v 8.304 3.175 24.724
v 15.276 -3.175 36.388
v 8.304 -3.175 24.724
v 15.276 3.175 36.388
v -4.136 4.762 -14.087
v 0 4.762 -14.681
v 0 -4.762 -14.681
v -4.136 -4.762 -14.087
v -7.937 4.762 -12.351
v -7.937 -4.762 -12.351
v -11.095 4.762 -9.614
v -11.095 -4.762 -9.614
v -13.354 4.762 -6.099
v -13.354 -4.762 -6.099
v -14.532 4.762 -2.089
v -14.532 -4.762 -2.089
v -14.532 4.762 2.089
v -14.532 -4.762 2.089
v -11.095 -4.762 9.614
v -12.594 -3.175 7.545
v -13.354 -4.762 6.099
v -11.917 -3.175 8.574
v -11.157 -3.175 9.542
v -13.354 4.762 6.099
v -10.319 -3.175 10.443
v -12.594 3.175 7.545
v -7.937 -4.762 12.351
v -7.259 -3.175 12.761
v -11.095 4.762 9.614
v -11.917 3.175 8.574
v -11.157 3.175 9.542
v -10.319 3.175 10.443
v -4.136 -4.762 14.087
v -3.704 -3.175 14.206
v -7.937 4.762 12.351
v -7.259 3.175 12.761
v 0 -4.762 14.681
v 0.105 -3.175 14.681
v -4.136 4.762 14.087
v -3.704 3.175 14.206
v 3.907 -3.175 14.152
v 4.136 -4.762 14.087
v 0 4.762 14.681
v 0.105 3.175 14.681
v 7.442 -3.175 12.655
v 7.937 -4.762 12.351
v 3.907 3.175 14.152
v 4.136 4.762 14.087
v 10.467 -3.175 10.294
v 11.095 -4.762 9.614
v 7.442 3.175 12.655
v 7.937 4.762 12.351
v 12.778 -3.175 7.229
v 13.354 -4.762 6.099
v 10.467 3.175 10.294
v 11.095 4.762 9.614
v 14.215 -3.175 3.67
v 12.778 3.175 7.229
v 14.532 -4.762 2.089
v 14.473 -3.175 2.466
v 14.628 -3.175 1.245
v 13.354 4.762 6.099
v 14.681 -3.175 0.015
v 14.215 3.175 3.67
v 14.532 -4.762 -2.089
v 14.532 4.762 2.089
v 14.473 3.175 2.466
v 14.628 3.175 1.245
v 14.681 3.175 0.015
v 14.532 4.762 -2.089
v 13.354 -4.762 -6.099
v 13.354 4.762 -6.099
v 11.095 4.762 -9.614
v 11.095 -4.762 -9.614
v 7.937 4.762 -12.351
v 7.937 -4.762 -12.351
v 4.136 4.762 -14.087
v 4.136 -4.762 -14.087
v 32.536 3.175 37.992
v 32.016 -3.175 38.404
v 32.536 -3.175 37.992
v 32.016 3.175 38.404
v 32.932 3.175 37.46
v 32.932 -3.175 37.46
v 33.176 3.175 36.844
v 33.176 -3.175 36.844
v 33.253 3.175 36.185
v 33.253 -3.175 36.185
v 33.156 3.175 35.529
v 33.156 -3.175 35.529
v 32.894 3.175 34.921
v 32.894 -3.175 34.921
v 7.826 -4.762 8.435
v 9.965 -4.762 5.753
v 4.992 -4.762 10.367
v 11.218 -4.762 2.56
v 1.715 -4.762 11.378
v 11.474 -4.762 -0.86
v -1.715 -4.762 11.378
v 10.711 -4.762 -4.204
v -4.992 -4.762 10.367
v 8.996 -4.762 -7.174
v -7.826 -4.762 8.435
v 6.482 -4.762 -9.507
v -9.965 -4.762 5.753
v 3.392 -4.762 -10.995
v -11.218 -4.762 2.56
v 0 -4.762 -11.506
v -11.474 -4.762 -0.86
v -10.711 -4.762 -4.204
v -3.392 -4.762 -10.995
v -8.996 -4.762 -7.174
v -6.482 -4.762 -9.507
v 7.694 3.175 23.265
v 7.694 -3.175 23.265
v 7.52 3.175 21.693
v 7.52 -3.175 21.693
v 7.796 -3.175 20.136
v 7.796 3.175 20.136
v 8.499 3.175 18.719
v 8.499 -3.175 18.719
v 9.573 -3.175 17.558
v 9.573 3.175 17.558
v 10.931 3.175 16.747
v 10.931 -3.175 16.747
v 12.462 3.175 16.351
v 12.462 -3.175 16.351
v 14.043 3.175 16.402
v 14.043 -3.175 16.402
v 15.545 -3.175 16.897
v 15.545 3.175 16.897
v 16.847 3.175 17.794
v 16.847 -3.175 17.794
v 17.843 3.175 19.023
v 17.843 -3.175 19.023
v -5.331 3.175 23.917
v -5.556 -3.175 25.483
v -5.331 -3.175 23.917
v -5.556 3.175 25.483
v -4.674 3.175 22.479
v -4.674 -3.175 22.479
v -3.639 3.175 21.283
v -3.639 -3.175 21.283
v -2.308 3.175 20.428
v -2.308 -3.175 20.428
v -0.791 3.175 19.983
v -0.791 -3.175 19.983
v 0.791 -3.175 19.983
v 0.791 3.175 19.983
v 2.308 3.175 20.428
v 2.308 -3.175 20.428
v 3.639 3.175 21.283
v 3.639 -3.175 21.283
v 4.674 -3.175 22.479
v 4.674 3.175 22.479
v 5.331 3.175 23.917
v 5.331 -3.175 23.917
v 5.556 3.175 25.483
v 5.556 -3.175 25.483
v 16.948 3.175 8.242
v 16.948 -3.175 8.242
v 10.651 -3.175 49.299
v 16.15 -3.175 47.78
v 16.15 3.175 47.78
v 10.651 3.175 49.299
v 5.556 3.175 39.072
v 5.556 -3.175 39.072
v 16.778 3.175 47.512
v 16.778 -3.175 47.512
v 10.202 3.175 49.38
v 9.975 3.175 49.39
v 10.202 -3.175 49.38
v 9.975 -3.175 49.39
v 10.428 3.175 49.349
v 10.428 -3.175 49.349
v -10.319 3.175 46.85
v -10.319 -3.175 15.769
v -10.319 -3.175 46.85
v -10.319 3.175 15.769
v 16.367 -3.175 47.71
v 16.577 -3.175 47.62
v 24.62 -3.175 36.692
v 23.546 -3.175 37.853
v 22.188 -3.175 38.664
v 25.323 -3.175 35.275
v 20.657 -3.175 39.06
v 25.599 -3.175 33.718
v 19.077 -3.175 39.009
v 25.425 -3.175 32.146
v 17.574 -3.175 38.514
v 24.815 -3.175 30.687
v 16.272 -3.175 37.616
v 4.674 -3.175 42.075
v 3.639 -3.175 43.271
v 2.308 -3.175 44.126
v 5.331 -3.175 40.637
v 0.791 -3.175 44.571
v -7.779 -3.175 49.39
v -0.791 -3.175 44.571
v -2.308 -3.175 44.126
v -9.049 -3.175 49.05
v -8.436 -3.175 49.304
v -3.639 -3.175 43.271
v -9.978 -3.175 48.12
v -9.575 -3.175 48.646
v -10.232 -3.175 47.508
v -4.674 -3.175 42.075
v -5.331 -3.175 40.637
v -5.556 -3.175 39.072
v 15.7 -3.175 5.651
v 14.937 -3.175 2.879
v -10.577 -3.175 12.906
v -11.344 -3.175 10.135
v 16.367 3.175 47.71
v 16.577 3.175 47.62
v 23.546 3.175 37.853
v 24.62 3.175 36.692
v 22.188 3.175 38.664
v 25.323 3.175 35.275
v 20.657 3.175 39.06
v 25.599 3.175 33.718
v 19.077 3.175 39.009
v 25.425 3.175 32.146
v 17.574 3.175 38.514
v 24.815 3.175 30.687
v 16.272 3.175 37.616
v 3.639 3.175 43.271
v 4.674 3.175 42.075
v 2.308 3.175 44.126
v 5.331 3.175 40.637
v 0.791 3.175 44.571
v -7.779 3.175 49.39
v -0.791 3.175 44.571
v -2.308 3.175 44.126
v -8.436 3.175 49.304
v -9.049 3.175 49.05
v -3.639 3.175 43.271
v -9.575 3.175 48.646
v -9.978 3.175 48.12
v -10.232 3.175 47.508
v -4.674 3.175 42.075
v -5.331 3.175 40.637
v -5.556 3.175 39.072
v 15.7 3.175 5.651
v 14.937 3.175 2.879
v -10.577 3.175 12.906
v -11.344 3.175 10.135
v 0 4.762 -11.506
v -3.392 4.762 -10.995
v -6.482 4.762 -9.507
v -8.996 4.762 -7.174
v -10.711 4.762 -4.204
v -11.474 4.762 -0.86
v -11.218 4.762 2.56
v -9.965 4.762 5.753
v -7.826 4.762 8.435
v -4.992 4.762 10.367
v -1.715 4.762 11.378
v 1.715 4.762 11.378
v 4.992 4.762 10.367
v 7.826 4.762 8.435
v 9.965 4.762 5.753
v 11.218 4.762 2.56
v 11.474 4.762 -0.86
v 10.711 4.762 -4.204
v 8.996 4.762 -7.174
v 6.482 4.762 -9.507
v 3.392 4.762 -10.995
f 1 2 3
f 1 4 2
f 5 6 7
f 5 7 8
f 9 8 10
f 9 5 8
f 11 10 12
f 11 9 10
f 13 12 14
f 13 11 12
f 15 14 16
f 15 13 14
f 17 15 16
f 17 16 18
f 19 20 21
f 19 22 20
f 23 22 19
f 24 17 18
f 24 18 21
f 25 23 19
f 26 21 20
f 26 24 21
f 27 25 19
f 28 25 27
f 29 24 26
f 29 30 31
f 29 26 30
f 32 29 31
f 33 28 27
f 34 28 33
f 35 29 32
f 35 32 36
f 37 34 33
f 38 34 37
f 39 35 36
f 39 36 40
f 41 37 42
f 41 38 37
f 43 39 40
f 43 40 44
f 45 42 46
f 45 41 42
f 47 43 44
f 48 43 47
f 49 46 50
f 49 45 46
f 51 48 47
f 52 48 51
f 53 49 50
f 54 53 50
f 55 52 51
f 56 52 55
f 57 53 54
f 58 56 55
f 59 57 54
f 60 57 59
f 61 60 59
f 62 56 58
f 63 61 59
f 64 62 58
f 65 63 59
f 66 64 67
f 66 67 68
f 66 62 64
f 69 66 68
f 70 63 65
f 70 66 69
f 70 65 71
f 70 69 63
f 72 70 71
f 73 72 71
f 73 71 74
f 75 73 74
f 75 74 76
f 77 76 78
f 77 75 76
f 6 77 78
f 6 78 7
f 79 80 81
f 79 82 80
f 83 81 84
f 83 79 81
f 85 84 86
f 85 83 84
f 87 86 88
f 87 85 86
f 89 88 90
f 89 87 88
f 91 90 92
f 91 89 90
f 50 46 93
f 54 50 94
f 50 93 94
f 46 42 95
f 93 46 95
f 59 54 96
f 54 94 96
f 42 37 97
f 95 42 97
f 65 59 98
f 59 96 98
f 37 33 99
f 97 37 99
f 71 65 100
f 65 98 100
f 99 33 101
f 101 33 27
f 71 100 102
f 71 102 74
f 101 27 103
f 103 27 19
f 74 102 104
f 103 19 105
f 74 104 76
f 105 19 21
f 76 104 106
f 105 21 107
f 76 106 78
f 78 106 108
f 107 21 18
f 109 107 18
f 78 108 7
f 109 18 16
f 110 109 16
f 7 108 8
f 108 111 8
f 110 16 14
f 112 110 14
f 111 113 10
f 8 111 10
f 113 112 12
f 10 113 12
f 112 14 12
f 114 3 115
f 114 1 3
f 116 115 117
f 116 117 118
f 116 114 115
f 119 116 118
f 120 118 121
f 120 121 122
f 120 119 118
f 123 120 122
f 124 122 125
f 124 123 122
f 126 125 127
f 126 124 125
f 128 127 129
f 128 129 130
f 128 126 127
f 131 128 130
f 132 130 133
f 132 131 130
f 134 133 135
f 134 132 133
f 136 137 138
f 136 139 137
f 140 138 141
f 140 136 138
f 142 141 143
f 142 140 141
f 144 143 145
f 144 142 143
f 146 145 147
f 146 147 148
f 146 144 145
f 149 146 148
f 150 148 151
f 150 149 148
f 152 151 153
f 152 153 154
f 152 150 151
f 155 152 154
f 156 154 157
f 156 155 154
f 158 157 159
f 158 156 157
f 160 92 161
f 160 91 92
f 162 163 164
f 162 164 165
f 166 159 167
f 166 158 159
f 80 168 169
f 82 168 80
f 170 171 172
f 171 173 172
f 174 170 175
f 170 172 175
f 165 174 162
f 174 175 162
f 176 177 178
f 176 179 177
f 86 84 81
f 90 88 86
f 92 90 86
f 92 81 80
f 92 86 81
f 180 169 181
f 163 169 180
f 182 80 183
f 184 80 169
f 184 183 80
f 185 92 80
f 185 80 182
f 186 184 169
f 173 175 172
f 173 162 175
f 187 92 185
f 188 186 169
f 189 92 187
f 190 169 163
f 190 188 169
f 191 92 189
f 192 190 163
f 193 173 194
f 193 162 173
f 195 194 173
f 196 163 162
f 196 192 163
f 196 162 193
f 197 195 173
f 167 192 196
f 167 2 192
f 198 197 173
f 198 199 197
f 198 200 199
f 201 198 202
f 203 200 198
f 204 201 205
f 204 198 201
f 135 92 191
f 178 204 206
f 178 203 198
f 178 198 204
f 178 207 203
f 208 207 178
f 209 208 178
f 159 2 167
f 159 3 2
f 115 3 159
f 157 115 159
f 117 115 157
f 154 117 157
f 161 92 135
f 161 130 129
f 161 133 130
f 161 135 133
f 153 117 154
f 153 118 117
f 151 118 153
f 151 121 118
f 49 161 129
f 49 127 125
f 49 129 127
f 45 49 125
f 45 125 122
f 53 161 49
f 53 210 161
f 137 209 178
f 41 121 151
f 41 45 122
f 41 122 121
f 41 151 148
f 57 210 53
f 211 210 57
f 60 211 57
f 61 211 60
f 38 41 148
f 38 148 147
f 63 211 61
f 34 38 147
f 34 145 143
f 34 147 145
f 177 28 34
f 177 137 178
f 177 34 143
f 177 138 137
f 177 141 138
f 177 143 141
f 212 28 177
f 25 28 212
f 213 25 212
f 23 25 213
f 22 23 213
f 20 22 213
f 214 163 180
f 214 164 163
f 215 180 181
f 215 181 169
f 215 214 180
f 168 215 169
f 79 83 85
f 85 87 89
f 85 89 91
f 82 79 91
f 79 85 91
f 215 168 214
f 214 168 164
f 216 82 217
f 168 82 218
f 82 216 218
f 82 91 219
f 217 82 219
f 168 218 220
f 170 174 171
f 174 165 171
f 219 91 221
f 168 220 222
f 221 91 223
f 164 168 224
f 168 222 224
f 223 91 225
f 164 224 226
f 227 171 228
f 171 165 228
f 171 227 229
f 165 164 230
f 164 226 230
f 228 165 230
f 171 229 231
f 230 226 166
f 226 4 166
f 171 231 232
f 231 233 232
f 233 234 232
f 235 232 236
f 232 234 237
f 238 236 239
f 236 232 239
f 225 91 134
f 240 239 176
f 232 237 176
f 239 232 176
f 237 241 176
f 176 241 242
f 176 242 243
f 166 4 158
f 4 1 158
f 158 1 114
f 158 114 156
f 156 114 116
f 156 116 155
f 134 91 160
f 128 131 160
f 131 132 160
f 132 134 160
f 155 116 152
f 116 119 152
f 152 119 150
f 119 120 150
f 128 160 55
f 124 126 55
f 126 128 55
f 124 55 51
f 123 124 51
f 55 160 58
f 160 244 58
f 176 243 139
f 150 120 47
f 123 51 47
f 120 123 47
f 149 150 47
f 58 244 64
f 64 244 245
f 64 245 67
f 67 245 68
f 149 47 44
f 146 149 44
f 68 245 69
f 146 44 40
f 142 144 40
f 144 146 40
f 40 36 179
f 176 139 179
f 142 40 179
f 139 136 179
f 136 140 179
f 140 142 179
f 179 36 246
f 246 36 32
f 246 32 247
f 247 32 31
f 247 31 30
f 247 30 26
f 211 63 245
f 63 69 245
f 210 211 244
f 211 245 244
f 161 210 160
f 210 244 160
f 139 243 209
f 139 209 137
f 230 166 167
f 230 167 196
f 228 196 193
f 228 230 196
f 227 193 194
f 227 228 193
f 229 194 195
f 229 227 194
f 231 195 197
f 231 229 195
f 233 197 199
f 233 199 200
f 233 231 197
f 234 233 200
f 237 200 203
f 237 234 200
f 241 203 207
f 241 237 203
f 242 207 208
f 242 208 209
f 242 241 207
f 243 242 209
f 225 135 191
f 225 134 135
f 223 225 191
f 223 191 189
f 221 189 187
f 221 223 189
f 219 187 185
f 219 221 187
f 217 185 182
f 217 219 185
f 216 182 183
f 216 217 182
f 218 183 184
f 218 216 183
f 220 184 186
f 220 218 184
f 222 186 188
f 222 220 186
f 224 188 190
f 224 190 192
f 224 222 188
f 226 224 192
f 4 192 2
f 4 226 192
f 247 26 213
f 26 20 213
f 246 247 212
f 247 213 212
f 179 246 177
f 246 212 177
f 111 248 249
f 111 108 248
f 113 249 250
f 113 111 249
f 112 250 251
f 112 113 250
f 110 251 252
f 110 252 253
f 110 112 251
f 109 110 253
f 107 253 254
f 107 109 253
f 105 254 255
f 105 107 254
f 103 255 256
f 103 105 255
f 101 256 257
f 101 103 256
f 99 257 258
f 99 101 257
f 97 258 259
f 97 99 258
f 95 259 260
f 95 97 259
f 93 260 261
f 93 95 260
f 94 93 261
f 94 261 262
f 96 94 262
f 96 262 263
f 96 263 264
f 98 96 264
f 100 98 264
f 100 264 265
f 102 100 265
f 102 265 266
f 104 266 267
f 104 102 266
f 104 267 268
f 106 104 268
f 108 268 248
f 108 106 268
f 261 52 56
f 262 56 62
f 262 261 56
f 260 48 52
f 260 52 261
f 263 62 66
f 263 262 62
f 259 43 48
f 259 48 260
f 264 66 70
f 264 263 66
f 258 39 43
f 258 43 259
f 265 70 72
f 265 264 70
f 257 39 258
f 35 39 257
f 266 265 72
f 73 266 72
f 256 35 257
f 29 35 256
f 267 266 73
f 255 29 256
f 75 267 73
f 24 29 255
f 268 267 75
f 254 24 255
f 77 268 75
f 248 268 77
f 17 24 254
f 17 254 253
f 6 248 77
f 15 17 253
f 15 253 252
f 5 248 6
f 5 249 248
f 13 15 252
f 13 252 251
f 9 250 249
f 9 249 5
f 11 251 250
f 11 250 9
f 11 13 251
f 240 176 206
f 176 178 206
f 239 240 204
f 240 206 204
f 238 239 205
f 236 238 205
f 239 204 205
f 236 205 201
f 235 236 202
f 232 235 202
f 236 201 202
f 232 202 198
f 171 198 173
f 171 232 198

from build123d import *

# Parameters (mm, degrees)
SKETCH1_R                      = 14.6812
SKETCH1_R_2                    = 11.5062
BEARING_INSERT_EXTRUDE_DEPTH   = 4.7625
APEX_SLOT_INSERT_EXTRUDE_DEPTH = 3.175
FILLET1_R                      = 16.002
FILLET2_R                      = 2.54


with BuildPart() as part:
    # Sketch1 → Bearing_Insert_Extrude (new, symmetric)
    with BuildSketch(Plane(origin=(0, 0, 0), x_dir=(1, 0, 0), z_dir=(0, 1, 0))):
        with Locations(Location((0, 0, 0), (0, 0, 90))):
            Circle(SKETCH1_R)
        with Locations(Location((0, 0, 0), (0, 0, 90))):
            Circle(SKETCH1_R_2, mode=Mode.SUBTRACT)
    extrude(amount=BEARING_INSERT_EXTRUDE_DEPTH, both=True)

    # Sketch1<4> → Apex_Slot_Insert_Extrude (add, symmetric)
    # profile 1 of 2: a face of its own
    with BuildSketch(Plane(origin=(0, 0, 0), x_dir=(1, 0, 0), z_dir=(0, 1, 0))):
        with BuildLine():
            Line((-10.31875, -10.443228997), (-10.31875, -49.3903))
            Line((-10.31875, -49.3903), (10.31875, -49.3903))
            Line((10.31875, -49.3903), (10.31875, -37.376828003))
            Line((10.31875, -37.376828003), (16.482194895, -47.68873648))
            Line((16.482194895, -47.68873648), (34.196641747, -37.100782052))
            Line((34.196641747, -37.100782052), (14.215063896, -3.670094259))
            ThreePointArc((14.215063896, -3.670094259), (3.906936657, -14.151801278), (-10.31875, -10.443228997))
        make_face()
        with BuildLine():
            ThreePointArc((5.55625, -39.07155), (0, -44.6278), (-5.55625, -39.07155))
            Line((-5.55625, -39.07155), (-5.55625, -25.48255))
            ThreePointArc((-5.55625, -25.48255), (0, -19.9263), (5.55625, -25.48255))
            Line((5.55625, -25.48255), (5.55625, -39.07155))
        make_face(mode=Mode.SUBTRACT)
        with BuildLine():
            ThreePointArc((24.81471526, -30.686932725), (22.896044222, -38.306809993), (15.276166955, -36.388138955))
            Line((15.276166955, -36.388138955), (8.304406193, -24.723857028))
            ThreePointArc((8.304406193, -24.723857028), (10.22307723, -17.10397976), (17.842954497, -19.022650798))
            Line((17.842954497, -19.022650798), (24.81471526, -30.686932725))
        make_face(mode=Mode.SUBTRACT)
    # profile 2 of 2: a face of its own
    with BuildSketch(Plane(origin=(0, 0, 0), x_dir=(1, 0, 0), z_dir=(0, 1, 0))):
        Polygon((10.31875, -49.3903), (10.31875, -37.376828003), (16.482194895, -47.68873648), align=None)
    extrude(amount=APEX_SLOT_INSERT_EXTRUDE_DEPTH, both=True)

    # Fillet1
    fillet1_edges = [part.edges().sort_by_distance(p)[0] for p in [
        (14.215063896, 0, 3.670094259),
        (-10.31875, 0, 10.443228997),
    ]]
    fillet(fillet1_edges, radius=FILLET1_R)

    # Fillet2
    fillet2_edges = [part.edges().sort_by_distance(p)[0] for p in [
        (-10.31875, 0, 49.3903),
        (10.31875, 0, 49.3903),
        (16.482194895, 0, 47.68873648),
        (34.196641747, 0, 37.100782052),
    ]]
    fillet(fillet2_edges, radius=FILLET2_R)


solid = part.part
